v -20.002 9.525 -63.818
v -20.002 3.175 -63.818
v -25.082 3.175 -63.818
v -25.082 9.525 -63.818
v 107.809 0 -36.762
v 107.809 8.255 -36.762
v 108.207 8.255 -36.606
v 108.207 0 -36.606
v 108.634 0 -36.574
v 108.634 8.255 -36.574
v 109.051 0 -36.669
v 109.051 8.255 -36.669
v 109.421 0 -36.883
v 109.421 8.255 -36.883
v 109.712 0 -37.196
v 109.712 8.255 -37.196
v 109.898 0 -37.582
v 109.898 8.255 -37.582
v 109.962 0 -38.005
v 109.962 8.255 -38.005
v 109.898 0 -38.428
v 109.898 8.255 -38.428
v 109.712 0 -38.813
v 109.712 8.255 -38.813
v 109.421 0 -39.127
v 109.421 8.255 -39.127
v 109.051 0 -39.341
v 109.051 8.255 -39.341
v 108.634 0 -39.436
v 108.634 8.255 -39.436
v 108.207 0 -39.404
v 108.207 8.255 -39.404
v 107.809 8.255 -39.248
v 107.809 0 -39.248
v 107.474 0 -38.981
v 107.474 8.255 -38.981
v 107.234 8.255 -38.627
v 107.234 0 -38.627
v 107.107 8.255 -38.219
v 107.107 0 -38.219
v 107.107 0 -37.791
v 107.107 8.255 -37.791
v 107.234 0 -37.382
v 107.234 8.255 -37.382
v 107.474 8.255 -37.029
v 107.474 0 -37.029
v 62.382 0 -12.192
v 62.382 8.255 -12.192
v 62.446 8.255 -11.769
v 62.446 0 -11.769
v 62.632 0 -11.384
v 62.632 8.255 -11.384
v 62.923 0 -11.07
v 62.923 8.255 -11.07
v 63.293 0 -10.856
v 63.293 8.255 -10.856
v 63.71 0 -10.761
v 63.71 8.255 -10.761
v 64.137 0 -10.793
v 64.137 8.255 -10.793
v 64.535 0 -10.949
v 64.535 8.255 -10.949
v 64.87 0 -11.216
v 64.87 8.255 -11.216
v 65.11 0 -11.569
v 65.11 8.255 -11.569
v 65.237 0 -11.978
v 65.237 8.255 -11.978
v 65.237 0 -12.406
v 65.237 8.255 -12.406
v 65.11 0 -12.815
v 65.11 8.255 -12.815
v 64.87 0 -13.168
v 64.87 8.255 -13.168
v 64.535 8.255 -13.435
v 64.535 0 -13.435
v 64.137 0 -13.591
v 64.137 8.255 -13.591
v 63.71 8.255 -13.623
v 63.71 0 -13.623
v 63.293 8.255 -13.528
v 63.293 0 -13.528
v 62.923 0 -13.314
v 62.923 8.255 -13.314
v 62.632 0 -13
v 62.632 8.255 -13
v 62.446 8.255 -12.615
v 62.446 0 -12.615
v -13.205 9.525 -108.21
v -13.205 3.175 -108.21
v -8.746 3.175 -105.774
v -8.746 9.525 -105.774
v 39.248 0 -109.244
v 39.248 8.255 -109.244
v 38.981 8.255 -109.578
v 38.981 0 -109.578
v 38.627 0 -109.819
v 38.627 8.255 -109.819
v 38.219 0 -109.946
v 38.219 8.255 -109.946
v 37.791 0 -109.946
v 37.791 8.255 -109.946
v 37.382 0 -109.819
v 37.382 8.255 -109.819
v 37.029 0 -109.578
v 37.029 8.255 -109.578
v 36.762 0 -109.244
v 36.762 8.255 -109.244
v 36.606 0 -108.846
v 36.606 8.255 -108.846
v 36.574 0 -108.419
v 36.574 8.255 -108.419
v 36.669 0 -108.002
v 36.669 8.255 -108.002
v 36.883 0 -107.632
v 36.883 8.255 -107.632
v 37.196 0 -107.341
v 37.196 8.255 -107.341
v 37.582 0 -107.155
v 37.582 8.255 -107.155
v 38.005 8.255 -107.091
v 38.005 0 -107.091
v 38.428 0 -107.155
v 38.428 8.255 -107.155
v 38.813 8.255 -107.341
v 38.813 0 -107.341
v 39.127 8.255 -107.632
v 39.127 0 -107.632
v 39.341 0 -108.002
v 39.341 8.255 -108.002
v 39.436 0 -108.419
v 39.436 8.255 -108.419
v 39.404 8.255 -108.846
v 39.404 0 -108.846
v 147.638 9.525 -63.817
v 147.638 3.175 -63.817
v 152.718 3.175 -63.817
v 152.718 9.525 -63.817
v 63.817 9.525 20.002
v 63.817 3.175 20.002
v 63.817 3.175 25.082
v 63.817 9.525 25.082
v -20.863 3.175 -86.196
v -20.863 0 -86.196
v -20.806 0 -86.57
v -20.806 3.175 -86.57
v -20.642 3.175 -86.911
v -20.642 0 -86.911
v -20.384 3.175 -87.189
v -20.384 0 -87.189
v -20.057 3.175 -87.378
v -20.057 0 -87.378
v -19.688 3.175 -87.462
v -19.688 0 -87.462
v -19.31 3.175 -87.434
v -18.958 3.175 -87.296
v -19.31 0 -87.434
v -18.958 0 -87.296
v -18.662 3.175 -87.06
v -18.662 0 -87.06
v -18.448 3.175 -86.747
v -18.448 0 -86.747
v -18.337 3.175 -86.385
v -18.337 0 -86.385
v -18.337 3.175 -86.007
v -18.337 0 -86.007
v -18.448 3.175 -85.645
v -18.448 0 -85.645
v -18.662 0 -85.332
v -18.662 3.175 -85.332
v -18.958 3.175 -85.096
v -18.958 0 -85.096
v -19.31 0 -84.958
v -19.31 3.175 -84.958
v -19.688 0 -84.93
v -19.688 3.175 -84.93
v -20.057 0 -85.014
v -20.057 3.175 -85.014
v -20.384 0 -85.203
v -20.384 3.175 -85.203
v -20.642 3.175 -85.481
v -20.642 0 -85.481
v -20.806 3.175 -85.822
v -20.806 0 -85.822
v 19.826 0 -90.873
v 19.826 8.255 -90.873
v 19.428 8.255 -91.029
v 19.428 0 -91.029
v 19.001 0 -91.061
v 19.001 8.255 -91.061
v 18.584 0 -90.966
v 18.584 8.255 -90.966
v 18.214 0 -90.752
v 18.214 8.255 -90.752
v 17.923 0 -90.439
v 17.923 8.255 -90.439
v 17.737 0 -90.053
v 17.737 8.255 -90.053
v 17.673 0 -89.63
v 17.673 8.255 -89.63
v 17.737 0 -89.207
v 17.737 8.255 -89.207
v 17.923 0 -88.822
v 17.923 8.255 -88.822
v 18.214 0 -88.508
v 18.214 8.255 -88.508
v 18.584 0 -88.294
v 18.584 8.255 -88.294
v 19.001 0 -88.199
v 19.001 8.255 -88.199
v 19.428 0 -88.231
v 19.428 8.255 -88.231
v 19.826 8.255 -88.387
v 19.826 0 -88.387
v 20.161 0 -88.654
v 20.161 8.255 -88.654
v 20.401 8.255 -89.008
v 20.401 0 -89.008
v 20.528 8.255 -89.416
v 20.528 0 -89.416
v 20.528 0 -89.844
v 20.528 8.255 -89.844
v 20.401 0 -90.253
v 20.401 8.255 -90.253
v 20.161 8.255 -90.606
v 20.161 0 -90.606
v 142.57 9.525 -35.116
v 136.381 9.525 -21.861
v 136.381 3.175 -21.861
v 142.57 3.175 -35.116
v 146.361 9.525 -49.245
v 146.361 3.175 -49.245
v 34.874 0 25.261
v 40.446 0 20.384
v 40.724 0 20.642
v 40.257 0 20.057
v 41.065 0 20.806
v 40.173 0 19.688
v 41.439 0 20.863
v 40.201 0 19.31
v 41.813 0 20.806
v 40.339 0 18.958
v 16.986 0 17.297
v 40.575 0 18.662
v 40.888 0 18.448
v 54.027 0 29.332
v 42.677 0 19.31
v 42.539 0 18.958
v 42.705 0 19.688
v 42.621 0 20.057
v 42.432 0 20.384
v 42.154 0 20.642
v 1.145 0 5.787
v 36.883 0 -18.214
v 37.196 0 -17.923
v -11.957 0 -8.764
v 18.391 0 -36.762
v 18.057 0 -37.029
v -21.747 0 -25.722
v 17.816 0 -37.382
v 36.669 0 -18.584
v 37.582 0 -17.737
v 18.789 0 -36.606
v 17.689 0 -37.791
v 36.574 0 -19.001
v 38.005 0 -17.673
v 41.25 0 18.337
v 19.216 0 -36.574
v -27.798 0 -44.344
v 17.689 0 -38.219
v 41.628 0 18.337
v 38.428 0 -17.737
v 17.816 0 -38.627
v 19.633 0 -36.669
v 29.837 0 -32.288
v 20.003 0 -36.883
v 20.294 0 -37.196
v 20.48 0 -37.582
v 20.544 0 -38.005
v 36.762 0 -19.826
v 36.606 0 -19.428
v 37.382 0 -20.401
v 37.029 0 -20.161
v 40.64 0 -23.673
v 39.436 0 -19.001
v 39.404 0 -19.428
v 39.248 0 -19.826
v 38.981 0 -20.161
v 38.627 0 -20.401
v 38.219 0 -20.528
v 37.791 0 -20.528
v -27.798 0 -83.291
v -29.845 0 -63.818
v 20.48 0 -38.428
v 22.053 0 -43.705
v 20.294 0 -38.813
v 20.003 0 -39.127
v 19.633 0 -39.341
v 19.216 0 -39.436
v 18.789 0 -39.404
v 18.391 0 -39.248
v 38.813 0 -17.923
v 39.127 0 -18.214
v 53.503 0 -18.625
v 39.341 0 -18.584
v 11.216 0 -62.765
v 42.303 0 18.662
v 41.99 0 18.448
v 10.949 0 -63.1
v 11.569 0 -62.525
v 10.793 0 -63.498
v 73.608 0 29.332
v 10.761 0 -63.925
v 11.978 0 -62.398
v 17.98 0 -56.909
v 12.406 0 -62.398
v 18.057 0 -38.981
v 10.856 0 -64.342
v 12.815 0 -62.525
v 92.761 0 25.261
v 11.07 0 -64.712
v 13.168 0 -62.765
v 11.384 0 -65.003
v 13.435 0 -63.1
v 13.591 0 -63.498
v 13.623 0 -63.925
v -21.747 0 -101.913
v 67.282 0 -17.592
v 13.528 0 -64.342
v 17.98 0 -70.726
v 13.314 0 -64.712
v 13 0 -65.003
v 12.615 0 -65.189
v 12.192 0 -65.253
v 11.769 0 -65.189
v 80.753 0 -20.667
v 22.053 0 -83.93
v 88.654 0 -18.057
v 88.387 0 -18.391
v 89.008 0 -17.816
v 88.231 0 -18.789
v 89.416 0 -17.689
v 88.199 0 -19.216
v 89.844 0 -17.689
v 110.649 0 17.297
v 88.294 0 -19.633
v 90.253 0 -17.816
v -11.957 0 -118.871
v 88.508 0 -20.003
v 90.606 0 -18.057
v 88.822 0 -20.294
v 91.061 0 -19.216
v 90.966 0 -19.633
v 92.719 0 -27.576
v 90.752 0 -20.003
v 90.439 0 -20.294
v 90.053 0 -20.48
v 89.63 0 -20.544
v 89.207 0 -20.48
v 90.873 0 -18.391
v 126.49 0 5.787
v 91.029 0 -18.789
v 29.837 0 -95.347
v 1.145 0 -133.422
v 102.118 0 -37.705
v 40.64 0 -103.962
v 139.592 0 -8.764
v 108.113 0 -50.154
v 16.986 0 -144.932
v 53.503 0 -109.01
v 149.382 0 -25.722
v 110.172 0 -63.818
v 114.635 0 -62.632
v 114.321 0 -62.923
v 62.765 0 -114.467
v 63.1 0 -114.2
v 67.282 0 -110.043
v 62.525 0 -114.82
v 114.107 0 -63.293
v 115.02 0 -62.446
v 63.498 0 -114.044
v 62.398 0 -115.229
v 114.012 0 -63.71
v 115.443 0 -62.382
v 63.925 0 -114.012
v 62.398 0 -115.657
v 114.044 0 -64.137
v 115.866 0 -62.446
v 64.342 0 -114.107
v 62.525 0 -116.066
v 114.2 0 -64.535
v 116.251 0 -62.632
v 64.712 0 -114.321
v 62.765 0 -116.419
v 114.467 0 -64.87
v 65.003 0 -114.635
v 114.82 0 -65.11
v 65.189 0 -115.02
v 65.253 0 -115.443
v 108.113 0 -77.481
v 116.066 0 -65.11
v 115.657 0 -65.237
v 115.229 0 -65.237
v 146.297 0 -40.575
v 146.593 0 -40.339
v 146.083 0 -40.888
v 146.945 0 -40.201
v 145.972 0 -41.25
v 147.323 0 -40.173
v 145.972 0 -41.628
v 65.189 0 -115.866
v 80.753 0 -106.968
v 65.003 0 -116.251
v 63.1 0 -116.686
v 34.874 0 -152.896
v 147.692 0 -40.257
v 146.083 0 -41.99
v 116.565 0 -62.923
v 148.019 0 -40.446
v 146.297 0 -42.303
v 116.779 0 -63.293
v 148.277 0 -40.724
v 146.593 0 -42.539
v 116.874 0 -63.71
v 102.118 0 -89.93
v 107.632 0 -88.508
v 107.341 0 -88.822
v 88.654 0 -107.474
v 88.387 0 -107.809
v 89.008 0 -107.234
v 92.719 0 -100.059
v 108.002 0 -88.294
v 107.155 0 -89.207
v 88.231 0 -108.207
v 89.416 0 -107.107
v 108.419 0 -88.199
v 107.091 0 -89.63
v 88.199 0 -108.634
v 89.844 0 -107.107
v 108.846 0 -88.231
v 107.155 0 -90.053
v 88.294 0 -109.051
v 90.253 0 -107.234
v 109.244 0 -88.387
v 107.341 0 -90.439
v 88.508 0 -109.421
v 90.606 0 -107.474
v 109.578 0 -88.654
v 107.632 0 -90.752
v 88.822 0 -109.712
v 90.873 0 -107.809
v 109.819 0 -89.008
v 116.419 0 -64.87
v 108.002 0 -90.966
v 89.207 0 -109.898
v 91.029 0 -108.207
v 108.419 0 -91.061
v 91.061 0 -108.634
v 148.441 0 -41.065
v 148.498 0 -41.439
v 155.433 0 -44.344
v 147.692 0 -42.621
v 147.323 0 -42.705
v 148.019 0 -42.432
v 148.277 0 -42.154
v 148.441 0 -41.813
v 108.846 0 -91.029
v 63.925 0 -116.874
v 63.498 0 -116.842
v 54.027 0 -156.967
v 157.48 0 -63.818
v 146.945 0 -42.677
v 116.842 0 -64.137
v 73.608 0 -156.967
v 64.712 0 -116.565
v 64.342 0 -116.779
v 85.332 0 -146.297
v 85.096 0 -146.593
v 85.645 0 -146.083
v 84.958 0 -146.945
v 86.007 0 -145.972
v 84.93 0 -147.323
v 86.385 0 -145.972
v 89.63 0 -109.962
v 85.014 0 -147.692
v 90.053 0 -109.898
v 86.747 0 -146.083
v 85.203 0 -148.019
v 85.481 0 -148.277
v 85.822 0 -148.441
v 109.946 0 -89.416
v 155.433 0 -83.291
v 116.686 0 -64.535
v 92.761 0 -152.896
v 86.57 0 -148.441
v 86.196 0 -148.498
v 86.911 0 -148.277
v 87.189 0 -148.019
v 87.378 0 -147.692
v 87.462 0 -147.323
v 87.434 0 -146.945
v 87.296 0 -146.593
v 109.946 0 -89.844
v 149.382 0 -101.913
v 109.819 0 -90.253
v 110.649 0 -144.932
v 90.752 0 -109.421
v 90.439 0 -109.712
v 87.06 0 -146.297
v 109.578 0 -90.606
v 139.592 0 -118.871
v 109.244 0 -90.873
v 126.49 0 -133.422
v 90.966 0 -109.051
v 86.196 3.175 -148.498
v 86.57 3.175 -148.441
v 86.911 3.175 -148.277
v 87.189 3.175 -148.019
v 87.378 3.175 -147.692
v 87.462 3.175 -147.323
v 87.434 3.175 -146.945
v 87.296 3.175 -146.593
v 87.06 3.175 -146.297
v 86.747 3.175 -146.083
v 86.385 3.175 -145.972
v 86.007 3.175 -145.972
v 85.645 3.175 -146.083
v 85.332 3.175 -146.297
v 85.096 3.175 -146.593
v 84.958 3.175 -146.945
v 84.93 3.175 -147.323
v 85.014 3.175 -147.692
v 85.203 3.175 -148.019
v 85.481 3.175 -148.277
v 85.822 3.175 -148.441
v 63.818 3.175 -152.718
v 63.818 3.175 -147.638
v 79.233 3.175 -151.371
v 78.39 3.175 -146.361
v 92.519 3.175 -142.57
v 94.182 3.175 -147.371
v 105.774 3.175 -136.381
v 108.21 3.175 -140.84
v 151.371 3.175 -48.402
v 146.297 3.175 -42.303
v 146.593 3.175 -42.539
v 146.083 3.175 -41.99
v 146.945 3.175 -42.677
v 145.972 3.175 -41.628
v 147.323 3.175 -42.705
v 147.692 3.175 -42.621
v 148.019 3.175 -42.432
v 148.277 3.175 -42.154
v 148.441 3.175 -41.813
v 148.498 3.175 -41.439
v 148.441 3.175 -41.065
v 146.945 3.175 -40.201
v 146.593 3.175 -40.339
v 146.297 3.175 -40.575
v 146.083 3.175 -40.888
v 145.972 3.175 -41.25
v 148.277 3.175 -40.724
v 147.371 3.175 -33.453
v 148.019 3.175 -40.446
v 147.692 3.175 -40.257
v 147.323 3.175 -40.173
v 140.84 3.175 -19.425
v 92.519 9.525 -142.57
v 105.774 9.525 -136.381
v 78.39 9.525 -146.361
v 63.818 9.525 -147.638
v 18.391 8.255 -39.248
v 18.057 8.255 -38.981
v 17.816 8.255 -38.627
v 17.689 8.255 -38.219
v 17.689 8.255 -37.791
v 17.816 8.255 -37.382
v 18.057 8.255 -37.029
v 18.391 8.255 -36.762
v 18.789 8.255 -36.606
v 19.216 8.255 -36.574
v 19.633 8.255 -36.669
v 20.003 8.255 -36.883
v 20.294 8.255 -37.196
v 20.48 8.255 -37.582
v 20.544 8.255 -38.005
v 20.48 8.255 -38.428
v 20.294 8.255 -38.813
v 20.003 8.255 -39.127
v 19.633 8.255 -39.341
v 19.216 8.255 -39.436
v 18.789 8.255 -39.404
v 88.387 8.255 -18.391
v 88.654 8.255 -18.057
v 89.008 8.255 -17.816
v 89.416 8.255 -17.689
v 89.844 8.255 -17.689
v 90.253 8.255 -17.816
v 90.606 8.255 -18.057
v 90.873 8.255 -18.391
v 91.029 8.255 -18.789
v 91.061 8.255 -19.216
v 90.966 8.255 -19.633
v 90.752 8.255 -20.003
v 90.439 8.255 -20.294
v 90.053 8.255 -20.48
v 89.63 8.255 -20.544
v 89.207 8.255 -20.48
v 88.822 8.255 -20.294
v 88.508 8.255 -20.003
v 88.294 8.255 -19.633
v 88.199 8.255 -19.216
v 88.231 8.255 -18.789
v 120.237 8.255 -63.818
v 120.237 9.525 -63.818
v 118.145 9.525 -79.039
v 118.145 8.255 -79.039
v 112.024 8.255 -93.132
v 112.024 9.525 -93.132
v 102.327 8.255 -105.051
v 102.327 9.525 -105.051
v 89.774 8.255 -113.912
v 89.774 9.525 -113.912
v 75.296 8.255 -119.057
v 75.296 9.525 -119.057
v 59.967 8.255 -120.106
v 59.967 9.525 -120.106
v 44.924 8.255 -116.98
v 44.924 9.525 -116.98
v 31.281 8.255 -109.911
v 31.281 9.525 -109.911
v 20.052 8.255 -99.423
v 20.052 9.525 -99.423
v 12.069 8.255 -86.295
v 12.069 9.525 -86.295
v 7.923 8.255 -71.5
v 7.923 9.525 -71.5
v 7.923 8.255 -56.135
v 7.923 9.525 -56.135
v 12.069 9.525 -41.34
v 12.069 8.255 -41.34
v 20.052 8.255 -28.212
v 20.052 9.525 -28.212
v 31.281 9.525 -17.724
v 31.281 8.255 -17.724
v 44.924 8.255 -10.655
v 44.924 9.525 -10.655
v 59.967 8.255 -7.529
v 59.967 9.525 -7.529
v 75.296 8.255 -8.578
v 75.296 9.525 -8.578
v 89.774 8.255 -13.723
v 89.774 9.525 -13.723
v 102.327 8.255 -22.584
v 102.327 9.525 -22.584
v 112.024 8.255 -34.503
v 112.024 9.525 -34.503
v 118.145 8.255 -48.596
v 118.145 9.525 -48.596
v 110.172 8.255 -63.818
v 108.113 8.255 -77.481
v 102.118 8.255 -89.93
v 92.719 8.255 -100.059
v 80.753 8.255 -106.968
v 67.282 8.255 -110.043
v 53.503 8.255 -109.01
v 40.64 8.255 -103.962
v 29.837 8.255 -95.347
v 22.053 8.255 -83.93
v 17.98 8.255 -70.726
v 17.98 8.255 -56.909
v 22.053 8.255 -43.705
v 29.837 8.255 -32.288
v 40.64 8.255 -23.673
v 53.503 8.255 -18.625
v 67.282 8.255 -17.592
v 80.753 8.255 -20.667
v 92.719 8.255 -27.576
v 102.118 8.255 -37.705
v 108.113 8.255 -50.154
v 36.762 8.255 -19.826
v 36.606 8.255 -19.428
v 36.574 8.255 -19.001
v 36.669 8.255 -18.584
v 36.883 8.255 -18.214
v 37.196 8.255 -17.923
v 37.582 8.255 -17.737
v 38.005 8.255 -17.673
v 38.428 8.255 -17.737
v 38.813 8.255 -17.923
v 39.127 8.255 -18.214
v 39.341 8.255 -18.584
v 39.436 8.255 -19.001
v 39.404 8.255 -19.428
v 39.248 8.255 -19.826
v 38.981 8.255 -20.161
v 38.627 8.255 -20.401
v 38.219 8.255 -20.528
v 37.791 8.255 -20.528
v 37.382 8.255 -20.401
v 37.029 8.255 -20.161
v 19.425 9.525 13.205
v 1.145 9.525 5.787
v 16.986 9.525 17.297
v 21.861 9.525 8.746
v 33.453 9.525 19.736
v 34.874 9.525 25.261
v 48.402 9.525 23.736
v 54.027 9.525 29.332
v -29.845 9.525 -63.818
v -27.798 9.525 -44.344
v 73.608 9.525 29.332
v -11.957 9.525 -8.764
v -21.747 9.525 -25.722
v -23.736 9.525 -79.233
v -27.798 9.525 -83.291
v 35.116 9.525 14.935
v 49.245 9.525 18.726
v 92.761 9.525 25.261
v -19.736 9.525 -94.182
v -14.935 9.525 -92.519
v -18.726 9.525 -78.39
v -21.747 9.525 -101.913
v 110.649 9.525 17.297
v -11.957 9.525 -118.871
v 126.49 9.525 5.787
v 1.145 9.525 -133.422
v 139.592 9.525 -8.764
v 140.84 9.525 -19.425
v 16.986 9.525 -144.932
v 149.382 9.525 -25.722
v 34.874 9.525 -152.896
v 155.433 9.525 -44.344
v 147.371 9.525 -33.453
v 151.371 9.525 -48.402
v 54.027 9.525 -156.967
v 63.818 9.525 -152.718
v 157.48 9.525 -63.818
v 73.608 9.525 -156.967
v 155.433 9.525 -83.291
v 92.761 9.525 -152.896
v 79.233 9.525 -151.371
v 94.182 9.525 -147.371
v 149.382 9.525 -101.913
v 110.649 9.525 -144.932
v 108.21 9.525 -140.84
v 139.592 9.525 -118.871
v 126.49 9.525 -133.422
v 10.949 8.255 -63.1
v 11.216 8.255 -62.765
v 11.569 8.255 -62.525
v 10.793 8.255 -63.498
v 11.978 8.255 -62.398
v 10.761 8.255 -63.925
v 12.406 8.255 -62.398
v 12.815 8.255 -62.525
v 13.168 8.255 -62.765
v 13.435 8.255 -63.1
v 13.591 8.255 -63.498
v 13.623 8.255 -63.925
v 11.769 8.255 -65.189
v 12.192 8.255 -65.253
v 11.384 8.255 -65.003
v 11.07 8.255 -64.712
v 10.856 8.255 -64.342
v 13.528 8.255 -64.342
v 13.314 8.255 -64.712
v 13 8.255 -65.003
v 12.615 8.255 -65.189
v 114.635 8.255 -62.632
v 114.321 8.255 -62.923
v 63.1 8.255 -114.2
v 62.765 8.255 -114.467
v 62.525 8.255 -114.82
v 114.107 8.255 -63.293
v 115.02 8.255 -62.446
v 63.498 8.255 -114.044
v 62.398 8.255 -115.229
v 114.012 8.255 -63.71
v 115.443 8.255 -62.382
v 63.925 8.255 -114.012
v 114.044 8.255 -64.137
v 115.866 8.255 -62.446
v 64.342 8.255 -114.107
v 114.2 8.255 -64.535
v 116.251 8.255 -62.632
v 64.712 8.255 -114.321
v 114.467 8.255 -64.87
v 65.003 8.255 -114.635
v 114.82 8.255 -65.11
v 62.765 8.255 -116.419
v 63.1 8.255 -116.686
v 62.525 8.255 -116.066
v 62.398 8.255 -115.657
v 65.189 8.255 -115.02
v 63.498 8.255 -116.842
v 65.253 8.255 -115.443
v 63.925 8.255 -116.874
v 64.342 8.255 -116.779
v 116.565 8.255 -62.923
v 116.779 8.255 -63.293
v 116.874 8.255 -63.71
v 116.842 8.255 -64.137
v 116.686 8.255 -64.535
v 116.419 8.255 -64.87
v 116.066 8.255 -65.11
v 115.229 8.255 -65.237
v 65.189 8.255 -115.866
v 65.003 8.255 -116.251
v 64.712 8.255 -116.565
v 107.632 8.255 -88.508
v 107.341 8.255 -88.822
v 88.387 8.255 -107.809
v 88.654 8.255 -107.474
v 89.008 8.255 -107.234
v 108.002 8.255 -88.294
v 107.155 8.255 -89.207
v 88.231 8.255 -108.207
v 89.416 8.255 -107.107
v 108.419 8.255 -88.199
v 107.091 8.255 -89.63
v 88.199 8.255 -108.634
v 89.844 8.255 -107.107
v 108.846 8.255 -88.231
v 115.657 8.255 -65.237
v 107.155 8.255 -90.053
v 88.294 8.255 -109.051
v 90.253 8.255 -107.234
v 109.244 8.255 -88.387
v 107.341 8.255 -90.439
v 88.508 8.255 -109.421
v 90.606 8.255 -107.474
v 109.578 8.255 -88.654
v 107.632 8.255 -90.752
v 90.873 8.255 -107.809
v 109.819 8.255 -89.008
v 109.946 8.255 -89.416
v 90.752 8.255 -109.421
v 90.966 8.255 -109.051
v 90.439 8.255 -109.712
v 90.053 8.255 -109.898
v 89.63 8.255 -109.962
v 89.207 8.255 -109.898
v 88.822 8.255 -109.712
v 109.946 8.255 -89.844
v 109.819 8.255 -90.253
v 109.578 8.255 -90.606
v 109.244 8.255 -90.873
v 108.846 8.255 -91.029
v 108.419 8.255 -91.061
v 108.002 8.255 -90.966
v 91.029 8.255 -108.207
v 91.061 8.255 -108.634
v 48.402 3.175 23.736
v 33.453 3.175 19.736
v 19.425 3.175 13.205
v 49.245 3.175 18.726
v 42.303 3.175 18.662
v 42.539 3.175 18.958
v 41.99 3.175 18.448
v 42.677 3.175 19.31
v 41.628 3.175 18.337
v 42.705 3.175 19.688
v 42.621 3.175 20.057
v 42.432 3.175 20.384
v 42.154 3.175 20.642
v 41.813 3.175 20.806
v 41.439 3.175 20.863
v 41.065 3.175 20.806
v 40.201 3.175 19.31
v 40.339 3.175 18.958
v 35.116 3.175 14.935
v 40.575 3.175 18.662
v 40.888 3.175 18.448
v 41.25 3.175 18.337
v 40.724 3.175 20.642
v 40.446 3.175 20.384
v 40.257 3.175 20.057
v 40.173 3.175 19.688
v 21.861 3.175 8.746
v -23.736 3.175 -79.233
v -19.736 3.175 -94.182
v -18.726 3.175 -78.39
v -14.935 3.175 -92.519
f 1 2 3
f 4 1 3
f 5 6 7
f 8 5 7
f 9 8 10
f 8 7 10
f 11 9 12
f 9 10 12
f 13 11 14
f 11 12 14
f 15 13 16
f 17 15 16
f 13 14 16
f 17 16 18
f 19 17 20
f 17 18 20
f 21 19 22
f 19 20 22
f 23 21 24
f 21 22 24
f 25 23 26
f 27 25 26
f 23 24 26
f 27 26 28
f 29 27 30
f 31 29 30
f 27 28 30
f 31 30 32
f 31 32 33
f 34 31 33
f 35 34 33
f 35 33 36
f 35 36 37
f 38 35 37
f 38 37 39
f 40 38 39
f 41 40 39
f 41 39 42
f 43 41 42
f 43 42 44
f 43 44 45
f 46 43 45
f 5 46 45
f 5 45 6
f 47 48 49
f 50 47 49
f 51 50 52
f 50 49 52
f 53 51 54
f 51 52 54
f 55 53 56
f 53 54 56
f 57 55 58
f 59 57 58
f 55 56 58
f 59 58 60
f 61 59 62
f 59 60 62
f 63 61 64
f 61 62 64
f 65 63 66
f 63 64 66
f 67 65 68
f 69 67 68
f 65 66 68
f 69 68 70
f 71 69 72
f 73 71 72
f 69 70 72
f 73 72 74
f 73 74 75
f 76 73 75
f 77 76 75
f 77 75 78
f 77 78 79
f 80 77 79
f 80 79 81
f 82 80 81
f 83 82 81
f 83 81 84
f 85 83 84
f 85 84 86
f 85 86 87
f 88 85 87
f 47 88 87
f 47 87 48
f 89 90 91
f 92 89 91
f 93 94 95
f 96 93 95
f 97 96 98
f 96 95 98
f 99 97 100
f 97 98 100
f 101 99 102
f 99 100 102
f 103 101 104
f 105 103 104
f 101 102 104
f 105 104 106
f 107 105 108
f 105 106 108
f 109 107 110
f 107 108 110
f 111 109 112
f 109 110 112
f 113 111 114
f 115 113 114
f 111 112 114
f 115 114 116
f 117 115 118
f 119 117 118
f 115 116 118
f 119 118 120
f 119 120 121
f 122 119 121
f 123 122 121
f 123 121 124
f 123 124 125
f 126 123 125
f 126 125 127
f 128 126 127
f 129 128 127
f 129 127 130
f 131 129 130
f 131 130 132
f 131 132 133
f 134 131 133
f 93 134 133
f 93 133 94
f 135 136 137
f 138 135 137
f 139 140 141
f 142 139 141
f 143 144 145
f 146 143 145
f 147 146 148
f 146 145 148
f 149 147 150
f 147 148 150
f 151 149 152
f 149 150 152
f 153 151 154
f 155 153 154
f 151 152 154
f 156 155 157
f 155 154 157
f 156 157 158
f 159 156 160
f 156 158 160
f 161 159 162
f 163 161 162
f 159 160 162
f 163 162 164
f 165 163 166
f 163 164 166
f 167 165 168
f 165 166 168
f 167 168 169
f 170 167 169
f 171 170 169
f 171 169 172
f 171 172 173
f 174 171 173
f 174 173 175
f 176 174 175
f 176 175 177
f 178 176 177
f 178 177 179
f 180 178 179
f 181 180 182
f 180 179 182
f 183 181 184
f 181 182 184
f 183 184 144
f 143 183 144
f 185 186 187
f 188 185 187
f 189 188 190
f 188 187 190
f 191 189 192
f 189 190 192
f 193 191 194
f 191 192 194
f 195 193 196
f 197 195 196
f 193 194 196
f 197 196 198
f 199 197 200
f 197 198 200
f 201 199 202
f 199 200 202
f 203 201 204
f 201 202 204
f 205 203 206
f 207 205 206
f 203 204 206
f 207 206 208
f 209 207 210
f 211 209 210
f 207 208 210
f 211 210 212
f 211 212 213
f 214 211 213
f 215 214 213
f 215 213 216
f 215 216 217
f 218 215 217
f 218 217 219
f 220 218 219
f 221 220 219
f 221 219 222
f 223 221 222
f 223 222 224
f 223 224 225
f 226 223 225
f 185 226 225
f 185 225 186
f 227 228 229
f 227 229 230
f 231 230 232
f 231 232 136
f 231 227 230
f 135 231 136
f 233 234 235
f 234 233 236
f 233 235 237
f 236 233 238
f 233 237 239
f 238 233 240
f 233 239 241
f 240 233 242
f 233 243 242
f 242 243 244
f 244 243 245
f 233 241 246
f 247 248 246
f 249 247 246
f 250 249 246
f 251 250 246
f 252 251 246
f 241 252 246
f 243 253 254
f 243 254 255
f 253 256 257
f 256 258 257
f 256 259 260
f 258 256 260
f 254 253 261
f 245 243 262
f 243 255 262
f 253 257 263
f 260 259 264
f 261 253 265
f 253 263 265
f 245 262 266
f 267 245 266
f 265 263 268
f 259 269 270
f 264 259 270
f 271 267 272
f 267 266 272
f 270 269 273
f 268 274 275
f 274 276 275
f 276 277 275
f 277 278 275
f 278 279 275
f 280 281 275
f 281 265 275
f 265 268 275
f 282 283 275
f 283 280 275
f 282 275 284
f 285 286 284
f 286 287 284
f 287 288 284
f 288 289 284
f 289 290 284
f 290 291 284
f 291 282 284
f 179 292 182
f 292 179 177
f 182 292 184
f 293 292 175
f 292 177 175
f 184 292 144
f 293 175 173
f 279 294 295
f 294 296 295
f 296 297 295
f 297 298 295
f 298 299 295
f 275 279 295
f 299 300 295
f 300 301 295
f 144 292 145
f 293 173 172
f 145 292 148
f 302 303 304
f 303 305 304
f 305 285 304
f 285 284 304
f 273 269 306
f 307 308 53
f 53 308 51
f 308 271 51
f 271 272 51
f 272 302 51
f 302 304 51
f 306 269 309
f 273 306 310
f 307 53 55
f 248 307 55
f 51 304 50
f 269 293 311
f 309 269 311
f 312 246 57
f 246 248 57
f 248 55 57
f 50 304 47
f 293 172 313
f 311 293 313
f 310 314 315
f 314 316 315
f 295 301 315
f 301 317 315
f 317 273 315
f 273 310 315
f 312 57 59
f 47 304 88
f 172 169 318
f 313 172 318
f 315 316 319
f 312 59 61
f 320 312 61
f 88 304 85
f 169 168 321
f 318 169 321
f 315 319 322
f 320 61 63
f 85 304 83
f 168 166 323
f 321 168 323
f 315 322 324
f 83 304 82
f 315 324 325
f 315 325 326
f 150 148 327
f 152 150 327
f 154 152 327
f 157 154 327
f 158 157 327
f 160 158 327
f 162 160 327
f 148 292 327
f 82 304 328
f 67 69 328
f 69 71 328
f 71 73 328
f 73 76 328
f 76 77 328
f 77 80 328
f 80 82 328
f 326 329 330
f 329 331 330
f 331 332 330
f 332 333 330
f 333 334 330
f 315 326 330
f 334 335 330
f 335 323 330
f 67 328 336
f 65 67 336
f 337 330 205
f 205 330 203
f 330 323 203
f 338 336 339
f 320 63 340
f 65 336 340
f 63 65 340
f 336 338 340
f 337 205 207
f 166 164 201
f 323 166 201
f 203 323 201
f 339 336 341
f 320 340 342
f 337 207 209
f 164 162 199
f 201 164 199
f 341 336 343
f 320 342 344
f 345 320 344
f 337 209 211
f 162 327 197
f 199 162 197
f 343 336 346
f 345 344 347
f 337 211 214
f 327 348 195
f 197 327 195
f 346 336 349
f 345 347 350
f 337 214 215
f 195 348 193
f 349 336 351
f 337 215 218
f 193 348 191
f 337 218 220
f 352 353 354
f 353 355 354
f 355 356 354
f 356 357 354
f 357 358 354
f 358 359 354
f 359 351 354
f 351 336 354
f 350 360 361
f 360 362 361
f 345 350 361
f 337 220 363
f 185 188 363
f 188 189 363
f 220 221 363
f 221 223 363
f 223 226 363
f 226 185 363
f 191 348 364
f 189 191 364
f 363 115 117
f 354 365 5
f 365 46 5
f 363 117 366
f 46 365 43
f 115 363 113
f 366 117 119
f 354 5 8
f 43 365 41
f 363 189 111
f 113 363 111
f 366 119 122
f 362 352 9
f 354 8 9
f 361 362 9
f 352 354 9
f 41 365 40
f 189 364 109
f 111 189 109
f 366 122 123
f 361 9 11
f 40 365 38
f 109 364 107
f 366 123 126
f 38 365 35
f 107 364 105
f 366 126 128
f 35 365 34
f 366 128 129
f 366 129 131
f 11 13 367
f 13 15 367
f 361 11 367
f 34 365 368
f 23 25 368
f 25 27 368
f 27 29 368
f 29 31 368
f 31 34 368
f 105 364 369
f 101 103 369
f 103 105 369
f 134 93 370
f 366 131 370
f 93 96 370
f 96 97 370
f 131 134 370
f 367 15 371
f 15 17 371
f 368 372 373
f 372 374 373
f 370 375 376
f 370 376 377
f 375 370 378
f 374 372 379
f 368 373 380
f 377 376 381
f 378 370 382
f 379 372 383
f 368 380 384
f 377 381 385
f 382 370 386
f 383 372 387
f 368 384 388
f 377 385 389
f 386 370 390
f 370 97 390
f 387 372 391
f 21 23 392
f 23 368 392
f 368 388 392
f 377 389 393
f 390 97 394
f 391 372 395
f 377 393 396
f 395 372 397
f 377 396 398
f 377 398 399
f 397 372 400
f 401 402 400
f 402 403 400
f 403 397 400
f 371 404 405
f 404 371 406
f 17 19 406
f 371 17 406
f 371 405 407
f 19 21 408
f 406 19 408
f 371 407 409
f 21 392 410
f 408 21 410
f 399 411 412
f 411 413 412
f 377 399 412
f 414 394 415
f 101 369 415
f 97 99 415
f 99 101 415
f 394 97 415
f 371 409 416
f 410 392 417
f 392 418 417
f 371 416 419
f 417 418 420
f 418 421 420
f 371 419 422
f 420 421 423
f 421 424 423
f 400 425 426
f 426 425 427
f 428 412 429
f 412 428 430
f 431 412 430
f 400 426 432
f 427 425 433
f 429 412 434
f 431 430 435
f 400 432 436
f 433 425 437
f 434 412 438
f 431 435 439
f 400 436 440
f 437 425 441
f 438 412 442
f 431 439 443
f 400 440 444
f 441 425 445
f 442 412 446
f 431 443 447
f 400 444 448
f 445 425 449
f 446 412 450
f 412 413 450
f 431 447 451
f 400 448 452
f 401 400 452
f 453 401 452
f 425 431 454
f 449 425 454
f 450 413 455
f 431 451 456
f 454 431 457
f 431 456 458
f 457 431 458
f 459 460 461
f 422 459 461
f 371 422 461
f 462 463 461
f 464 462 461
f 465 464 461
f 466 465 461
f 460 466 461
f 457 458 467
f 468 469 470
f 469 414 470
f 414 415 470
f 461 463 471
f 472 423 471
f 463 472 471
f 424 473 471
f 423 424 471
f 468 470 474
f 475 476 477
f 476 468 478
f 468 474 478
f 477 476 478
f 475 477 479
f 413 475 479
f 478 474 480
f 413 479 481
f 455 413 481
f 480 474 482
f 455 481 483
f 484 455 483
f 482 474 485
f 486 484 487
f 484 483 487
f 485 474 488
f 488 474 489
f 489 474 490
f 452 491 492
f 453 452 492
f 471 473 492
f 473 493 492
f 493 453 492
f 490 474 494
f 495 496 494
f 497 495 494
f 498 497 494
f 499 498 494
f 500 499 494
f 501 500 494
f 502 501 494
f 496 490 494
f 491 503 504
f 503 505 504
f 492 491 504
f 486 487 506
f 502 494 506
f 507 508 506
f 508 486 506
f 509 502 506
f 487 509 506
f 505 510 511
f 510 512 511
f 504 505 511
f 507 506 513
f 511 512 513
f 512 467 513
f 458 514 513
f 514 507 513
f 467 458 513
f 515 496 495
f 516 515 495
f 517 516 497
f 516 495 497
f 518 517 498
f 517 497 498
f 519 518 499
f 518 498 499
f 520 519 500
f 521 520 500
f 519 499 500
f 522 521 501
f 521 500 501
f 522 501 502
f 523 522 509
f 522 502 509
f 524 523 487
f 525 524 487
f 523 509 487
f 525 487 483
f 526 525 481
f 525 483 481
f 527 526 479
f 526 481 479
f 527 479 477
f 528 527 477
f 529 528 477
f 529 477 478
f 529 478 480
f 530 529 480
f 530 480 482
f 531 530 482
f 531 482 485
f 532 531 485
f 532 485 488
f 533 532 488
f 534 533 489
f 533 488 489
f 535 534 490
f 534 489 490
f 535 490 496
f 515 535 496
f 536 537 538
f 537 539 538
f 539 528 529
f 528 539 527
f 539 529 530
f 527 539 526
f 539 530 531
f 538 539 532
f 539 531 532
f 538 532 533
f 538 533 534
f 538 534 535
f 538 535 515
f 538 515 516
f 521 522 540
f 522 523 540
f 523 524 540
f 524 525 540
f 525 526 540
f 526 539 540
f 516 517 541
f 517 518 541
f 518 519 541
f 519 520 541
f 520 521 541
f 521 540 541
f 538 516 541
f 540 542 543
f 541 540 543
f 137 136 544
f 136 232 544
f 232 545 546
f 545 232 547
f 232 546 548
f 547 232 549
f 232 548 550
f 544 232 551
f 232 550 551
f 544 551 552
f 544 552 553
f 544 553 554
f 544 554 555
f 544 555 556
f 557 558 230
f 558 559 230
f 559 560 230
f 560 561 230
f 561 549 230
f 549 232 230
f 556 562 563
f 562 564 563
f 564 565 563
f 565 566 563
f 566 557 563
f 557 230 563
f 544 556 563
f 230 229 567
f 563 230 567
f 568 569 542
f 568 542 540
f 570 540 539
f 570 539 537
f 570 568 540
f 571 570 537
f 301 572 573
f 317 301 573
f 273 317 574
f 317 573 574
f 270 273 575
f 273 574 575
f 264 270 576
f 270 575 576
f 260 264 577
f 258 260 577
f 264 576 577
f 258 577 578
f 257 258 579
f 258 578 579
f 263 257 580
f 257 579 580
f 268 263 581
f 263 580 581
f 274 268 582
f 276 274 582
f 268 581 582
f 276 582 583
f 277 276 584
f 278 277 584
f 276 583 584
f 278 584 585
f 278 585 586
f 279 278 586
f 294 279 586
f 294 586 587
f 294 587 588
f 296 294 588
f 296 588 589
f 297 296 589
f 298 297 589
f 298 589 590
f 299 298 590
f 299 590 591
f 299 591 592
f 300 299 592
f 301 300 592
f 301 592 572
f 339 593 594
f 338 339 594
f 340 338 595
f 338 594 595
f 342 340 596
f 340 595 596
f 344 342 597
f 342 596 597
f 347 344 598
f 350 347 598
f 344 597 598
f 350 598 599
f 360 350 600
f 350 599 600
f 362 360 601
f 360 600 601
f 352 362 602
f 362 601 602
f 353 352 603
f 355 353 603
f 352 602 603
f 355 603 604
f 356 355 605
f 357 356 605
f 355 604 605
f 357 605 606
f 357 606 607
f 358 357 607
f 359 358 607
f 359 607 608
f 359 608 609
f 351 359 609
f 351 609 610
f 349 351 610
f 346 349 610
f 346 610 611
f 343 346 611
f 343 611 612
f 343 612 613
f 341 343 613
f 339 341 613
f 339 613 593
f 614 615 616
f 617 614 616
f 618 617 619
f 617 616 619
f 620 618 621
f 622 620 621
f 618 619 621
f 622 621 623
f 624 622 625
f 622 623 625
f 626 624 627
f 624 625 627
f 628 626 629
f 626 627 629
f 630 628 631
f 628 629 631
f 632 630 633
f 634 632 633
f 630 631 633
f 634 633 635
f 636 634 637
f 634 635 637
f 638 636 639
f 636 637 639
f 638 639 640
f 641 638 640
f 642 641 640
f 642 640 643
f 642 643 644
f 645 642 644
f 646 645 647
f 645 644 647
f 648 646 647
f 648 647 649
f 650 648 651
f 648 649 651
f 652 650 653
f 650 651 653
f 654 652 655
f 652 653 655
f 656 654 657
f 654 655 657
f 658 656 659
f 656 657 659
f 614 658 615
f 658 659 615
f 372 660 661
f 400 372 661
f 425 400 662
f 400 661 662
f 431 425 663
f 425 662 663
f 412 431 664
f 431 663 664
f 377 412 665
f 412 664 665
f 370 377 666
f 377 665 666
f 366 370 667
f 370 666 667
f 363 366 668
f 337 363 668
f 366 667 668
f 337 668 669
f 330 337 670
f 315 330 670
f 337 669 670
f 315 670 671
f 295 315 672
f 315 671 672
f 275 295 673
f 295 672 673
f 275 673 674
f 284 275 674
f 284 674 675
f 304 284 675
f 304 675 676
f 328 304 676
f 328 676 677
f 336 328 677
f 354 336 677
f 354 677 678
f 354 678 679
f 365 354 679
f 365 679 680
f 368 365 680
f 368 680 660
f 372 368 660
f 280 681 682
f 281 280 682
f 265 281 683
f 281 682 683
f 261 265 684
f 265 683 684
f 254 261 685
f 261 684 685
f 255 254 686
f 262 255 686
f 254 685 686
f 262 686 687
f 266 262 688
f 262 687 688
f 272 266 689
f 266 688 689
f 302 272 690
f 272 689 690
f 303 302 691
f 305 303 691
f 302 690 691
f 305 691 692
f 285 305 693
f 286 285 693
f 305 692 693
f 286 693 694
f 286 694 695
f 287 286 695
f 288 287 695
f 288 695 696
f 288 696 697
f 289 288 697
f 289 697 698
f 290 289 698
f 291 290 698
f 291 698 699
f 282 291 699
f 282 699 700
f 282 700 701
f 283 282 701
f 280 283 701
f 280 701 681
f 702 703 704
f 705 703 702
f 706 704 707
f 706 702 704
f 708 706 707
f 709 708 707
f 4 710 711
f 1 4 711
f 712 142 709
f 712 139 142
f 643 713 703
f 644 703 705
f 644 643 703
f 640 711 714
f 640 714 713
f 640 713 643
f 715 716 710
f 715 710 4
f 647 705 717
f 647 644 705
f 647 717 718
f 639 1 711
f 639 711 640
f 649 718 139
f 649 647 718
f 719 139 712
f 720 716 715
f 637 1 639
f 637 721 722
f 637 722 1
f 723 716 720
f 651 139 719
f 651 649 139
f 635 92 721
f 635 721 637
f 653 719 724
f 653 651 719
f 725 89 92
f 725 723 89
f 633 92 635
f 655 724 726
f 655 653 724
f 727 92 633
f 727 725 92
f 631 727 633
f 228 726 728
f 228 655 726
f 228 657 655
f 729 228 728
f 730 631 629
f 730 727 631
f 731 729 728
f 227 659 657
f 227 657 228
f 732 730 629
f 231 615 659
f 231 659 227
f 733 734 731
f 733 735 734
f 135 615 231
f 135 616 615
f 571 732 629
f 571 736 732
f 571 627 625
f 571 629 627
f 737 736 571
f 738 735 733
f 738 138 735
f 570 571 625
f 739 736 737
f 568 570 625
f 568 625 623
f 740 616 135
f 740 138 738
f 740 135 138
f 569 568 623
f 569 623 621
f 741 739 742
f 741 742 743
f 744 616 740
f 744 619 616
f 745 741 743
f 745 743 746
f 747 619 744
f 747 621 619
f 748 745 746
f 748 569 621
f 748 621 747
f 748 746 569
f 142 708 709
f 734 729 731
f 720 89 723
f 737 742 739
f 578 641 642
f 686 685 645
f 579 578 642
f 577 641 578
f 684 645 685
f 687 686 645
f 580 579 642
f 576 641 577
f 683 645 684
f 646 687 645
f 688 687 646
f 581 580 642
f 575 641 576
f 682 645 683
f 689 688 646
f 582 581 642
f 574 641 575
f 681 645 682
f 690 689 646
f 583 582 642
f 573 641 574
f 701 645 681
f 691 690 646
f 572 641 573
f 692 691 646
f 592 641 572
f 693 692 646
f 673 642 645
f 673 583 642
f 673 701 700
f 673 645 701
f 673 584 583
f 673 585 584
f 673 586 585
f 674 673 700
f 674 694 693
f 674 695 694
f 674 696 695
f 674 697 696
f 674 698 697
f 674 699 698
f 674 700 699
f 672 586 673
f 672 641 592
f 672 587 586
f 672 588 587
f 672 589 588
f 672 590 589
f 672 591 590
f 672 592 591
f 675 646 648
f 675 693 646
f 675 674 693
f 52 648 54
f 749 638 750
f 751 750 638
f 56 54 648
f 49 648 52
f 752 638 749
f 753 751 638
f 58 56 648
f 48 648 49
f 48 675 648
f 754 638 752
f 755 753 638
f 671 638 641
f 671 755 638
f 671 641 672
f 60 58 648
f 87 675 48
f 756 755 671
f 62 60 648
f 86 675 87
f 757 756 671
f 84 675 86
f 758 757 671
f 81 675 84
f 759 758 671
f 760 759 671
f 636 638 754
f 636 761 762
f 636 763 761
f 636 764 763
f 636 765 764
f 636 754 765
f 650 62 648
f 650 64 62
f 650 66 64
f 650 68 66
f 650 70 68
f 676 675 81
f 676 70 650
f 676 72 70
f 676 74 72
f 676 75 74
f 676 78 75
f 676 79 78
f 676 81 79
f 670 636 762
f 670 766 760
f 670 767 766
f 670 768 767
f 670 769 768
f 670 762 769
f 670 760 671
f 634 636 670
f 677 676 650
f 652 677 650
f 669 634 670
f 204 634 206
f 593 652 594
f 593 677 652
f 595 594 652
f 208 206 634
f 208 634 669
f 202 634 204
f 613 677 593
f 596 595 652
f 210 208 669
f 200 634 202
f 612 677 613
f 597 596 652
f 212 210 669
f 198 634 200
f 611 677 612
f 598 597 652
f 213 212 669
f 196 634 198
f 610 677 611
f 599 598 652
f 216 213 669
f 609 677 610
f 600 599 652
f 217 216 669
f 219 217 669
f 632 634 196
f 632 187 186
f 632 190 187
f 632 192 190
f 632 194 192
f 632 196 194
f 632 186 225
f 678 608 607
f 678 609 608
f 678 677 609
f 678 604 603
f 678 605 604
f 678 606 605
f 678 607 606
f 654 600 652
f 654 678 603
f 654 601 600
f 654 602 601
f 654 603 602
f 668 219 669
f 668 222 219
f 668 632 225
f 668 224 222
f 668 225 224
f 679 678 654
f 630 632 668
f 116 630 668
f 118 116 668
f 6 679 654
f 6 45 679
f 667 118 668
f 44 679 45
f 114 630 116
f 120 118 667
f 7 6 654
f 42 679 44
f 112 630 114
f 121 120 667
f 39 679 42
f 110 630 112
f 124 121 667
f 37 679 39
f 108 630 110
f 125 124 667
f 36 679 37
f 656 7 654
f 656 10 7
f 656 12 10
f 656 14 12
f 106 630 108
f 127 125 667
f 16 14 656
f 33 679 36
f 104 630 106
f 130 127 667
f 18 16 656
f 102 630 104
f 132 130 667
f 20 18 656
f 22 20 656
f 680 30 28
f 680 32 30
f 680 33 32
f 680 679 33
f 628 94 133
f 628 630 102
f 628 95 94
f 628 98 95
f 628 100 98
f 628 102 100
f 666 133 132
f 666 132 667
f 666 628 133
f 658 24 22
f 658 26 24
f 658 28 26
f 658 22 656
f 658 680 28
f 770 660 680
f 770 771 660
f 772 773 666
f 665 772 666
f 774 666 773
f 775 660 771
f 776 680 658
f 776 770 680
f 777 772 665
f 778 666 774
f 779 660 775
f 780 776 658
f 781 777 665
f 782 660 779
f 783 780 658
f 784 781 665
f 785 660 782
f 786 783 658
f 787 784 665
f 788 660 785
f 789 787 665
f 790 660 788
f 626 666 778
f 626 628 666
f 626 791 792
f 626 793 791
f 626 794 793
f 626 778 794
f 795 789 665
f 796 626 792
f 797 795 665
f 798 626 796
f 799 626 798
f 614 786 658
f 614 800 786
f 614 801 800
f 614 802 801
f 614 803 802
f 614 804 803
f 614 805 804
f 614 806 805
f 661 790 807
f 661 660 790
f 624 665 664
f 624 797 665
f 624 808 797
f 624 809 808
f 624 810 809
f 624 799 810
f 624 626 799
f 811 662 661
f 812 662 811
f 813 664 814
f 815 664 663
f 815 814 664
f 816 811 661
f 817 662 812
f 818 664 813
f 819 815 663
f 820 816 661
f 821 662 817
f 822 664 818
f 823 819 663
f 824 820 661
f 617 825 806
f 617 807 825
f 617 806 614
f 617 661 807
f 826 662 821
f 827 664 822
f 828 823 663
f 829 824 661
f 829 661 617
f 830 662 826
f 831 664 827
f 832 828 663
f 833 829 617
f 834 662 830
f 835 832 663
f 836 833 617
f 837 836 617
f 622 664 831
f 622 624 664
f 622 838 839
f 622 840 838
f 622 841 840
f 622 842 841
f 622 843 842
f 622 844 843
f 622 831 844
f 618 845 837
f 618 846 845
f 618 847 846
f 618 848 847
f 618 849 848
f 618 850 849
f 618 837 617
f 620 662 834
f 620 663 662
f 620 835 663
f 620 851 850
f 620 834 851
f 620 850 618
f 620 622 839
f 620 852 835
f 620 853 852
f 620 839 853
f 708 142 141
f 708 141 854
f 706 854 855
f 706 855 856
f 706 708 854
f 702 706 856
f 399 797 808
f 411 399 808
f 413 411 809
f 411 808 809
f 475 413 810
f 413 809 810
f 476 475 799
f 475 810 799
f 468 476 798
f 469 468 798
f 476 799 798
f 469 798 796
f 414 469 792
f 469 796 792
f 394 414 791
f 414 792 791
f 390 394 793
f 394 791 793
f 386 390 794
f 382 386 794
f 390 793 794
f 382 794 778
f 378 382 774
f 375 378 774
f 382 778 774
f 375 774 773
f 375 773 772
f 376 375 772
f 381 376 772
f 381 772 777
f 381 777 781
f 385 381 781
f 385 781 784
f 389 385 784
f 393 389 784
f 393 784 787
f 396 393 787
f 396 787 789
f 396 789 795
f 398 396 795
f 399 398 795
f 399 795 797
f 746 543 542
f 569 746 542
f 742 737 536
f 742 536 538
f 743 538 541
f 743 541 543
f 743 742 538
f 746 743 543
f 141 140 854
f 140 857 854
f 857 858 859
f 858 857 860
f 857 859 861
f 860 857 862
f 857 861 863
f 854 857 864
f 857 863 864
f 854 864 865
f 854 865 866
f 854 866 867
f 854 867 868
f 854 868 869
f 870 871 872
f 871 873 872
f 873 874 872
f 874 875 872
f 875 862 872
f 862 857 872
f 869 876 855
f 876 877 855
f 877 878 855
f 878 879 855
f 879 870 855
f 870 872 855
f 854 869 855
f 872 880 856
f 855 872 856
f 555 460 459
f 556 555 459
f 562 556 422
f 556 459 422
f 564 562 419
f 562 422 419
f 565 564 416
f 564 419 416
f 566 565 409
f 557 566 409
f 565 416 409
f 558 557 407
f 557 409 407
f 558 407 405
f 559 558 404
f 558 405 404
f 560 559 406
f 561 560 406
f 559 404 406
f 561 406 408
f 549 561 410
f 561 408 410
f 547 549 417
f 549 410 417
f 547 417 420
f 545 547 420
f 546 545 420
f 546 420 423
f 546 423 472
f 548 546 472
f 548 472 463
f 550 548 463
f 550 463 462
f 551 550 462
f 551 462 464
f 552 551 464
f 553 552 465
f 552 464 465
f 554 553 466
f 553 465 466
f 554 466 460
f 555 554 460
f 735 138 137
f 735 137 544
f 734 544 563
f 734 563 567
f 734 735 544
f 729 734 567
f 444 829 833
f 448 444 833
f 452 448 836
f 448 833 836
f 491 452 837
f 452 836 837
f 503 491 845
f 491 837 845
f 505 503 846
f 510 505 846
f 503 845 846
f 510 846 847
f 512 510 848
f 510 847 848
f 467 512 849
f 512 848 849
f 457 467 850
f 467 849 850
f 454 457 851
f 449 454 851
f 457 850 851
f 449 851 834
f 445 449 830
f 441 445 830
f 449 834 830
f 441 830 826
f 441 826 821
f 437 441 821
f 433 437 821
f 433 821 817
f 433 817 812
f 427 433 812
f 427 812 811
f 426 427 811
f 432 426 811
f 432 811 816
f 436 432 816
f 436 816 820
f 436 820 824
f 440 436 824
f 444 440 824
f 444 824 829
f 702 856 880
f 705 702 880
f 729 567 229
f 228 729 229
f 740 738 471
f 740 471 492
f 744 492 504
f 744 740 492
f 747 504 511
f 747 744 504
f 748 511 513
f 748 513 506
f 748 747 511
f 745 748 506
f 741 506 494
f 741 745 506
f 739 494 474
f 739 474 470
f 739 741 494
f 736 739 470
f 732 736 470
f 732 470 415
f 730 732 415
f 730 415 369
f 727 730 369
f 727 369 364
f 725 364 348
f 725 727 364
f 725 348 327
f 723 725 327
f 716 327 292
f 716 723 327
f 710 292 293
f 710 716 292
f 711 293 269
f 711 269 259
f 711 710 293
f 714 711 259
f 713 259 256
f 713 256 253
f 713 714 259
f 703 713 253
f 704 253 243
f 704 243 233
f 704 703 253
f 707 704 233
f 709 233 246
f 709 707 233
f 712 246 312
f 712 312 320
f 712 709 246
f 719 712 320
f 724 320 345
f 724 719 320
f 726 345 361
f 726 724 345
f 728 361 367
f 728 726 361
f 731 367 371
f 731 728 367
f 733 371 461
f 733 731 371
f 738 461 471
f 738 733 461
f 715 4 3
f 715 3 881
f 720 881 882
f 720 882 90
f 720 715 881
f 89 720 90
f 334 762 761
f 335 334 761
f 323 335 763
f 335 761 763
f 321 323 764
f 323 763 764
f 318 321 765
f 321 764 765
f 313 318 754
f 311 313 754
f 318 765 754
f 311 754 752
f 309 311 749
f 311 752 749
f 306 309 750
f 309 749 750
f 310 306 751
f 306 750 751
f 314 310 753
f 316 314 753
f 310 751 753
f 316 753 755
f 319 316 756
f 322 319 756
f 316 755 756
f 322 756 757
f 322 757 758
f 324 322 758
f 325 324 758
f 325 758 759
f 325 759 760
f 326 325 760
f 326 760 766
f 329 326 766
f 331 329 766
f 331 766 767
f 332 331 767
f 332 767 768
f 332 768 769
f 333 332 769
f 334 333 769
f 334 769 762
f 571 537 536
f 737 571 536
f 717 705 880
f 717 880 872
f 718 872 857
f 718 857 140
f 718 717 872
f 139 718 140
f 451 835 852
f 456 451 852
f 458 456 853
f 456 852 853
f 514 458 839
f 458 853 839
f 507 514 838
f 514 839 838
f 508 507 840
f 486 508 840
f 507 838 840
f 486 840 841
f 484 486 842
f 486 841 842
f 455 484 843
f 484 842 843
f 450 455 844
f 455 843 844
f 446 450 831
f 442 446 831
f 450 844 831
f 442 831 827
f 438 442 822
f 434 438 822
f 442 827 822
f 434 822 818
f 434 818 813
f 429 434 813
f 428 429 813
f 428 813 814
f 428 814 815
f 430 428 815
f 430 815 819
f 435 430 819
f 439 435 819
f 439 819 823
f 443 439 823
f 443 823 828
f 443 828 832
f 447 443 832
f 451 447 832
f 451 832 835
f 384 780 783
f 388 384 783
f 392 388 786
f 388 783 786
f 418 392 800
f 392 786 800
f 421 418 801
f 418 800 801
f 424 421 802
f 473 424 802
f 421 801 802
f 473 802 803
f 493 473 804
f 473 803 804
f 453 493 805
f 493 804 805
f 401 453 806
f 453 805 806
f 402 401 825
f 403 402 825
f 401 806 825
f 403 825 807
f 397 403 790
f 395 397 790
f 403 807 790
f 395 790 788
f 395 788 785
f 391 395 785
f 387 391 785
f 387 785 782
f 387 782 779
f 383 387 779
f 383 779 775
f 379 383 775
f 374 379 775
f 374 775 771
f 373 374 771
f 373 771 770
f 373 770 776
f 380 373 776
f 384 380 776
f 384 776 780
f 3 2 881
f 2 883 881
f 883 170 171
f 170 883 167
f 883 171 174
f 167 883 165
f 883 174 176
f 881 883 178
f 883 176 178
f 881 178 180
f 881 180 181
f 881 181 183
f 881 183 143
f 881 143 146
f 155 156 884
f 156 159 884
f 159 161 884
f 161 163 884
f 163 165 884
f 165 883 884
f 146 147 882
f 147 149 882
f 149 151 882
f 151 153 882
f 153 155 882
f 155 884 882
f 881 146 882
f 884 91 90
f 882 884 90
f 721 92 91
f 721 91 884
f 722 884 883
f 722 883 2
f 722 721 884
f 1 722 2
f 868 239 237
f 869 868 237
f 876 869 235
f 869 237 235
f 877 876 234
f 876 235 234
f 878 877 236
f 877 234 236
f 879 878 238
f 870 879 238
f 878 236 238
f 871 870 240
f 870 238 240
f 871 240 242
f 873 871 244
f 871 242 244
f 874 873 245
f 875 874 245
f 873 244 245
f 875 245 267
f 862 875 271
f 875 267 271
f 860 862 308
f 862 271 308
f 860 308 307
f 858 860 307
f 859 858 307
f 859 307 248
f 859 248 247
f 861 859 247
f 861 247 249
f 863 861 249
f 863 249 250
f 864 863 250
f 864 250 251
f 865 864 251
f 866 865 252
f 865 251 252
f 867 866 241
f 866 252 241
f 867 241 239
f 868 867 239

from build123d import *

# Parameters (mm, degrees)
SKETCH1_W                   = 127.635
SKETCH1_H                   = 127.635
BOSS_EXTRUDE1_DEPTH         = 9.525
SKETCH13_R                  = 93.6625
BOSS_EXTRUDE2_DEPTH         = 9.525
SKETCH5_R                   = 46.355
CUT_EXTRUDE1_DEPTH          = 9.525
SKETCH11_R                  = 1.4351
CUT_EXTRUDE3_DEPTH          = 10.525
CIRPATTERN1_COUNT           = 12
SKETCH12_R                  = 56.41975
CUT_EXTRUDE4_DEPTH          = 1.27
SUPPORT_HOLE_DEPTH          = 6.35
SKETCH16_R                  = 1.27
FRAME_BOLT_HOLE_DEPTH       = 3.175
FRAME_SUPPORT_PATTERN_COUNT = 4


with BuildPart() as part:
    # Sketch1 → Boss-Extrude1 (new body)
    with BuildSketch(Plane(origin=(0, 0, 0), x_dir=(1, 0, 0), z_dir=(0, 1, 0))):
        with Locations((63.8175, 63.8175)):
            Rectangle(SKETCH1_W, SKETCH1_H)
    extrude(amount=BOSS_EXTRUDE1_DEPTH)

    # Sketch13 → Boss-Extrude2 (add)
    with BuildSketch(Plane(origin=(0, 9.525, 0), x_dir=(1, 0, 0), z_dir=(0, 1, 0))):
        with Locations((63.8175, 63.8175)):
            Circle(SKETCH13_R)
    extrude(amount=-BOSS_EXTRUDE2_DEPTH)

    # Sketch5 → Cut-Extrude1 (cut)
    with BuildSketch(Plane(origin=(0, 9.525, 0), x_dir=(1, 0, 0), z_dir=(0, 1, 0))):
        with Locations((63.8175, 63.8175)):
            Circle(SKETCH5_R)
    extrude(amount=-CUT_EXTRUDE1_DEPTH, mode=Mode.SUBTRACT)

    # Sketch11 → Cut-Extrude3 (cut, through all)
    with BuildSketch(Plane(origin=(0, 9.525, 0), x_dir=(1, 0, 0), z_dir=(0, 1, 0))):
        with Locations((63.8175, 115.443)):
            Circle(SKETCH11_R)
    cut_extrude3 = extrude(amount=-CUT_EXTRUDE3_DEPTH, mode=Mode.SUBTRACT)

    # CirPattern1: Cut-Extrude3 ×12 about axis
    cirpattern1_axis = Axis((63.8175, 0, -63.8175), (0, 1, 0))
    for i in range(1, CIRPATTERN1_COUNT):
        add(cut_extrude3.rotate(cirpattern1_axis, i * 360 / CIRPATTERN1_COUNT), mode=Mode.SUBTRACT)

    # Sketch12 → Cut-Extrude4 (cut)
    with BuildSketch(Plane(origin=(0, 9.525, 0), x_dir=(1, 0, 0), z_dir=(0, 1, 0))):
        with Locations((63.8175, 63.8175)):
            Circle(SKETCH12_R)
    extrude(amount=-CUT_EXTRUDE4_DEPTH, mode=Mode.SUBTRACT)

    # Sketch15 → Support hole (cut)
    with BuildSketch(Plane(origin=(0, 9.525, 0), x_dir=(1, 0, 0), z_dir=(0, 1, 0))):
        with BuildLine():
            Line((-20.0025, 63.8175), (-25.0825, 63.8175))
            ThreePointArc((-25.0825, 63.8175), (-22.061832172, 86.794669228), (-13.205102796, 108.21038973))
            Line((-13.205102796, 108.21038973), (-8.745758996, 105.774213931))
            ThreePointArc((-8.745758996, 105.774213931), (-17.139416842, 85.53776739), (-20.0025, 63.8175))
        make_face()
    support_hole = extrude(amount=-SUPPORT_HOLE_DEPTH, mode=Mode.SUBTRACT)

    # Sketch16 → Frame bolt hole (cut)
    with BuildSketch(Plane(origin=(0, 0, 0), x_dir=(-1, 0, 0), z_dir=(0, -1, 0))):
        with Locations((19.592656746, 86.195957311)):
            Circle(SKETCH16_R)
    frame_bolt_hole = extrude(amount=-FRAME_BOLT_HOLE_DEPTH, mode=Mode.SUBTRACT)

    # Frame support pattern: Support hole, Frame bolt hole ×4 about axis
    frame_support_pattern_axis = Axis((63.8175, 0, -63.8175), (0, 1, 0))
    for i in range(1, FRAME_SUPPORT_PATTERN_COUNT):
        add(support_hole.rotate(frame_support_pattern_axis, i * 360 / FRAME_SUPPORT_PATTERN_COUNT), mode=Mode.SUBTRACT)
        add(frame_bolt_hole.rotate(frame_support_pattern_axis, i * 360 / FRAME_SUPPORT_PATTERN_COUNT), mode=Mode.SUBTRACT)


solid = part.part
